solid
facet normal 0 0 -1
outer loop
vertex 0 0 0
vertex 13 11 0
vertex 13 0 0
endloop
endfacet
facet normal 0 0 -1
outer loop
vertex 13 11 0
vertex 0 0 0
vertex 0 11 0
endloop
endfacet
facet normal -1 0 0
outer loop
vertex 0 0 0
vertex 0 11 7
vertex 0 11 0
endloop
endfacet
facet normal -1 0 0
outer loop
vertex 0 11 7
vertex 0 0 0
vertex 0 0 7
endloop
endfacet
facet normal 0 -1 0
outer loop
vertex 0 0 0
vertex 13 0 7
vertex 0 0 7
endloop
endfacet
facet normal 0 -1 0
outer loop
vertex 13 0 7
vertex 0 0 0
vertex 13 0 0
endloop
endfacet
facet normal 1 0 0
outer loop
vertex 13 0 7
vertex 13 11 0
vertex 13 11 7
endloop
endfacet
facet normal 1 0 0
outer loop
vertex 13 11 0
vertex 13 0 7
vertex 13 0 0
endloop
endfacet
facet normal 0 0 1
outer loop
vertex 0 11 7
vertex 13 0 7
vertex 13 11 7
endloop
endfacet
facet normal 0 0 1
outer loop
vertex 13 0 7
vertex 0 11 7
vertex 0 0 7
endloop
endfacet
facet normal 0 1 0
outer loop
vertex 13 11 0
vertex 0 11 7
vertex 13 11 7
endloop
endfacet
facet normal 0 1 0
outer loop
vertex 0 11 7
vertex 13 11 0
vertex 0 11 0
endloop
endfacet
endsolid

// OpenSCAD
translate([2.5, 1.5, 1.0]) color([0.3466679766399683, 0.3834140731648874, 0.7764198986996783]) cube([5, 3, 2], center=true);
translate([2.5, 1.5, 1.0]) color([0.49031967752424566, 0.8812766154122413, 0.6101197429062234]) cube([5, 3, 2], center=true);
translate([2.5, 1.5, 1.0]) color([0.4671884150380703, 0.6323126400553846, 0.3378653798287524]) cube([5, 3, 2], center=true);
translate([2.5, 1.5, 1.0]) color([0.12432379252825243, 0.6825296186925238, 0.622037442746657]) cube([5, 3, 2], center=true);
translate([2.5, 1.5, 1.0]) color([0.7885664913738635, 0.1271091249471088, 0.9117833181295222]) cube([5, 3, 2], center=true);
translate([2.5, 1.5, 1.0]) color([0.799341211421814, 0.9168874080910093, 0.8725347217734669]) cube([5, 3, 2], center=true);
translate([2.5, 1.5, 1.0]) color([0.681006446357057, 0.8102508494373589, 0.5190073092314018]) cube([5, 3, 2], center=true);
translate([3.5, 2.5, 1.5]) color([0.7854891493606652, 0.18912746785718504, 0.7821141063572942]) cube([7, 5, 3], center=true);
translate([3.5, 2.5, 1.5]) color([0.44457960405634067, 0.756616221297365, 0.4554702368121878]) cube([7, 5, 3], center=true);
translate([3.5, 2.5, 1.5]) color([0.7895587282777832, 0.07533958521856021, 0.04464090542441246]) cube([7, 5, 3], center=true);
translate([3.5, 2.5, 1.5]) color([0.9342895823715677, 0.4861651007487351, 0.9010713996489047]) cube([7, 5, 3], center=true);
translate([3.5, 2.5, 1.5]) color([0.9447832518820701, 0.6665111524556335, 0.5717968260934746]) cube([7, 5, 3], center=true);
translate([3.5, 2.5, 1.5]) color([0.21597938410680917, 0.09347621929900818, 0.8193942150822732]) cube([7, 5, 3], center=true);
translate([3.5, 2.5, 1.5]) color([0.8887720676319878, 0.7793957106948857, 0.6985024327316249]) cube([7, 5, 3], center=true);
translate([3.5, 2.5, 1.5]) color([0.42011111607482077, 0.3053115900269564, 0.11344489563770899]) cube([7, 5, 3], center=true);
translate([3.5, 2.5, 1.5]) color([0.425970248072163, 0.5660129742477574, 0.9228805831375125]) cube([7, 5, 3], center=true);
translate([3.5, 2.5, 1.5]) color([0.9357547693309531, 0.41564119654091314, 0.0992109880980957]) cube([7, 5, 3], center=true);
translate([3.5, 2.5, 1.5]) color([0.7738187324714434, 0.7342793416571158, 0.03070084595190614]) cube([7, 5, 3], center=true);
translate([5.5, 3.5, 2.5]) color([0.4467185991338365, 0.6864181042985581, 0.030134234552269934]) cube([11, 7, 5], center=true);
translate([5.5, 3.5, 2.5]) color([0.9192823534016137, 0.9622424865104192, 0.72254277208884]) cube([11, 7, 5], center=true);
translate([5.5, 3.5, 2.5]) color([0.0785385396518038, 0.07032946587635569, 0.3592533148212369]) cube([11, 7, 5], center=true);
translate([5.5, 3.5, 2.5]) color([0.029377507756986443, 0.3478777272843395, 0.009964241312966027]) cube([11, 7, 5], center=true);
translate([5.5, 3.5, 2.5]) color([0.9743235128409679, 0.8190066990688627, 0.07051761147818736]) cube([11, 7, 5], center=true);
translate([5.5, 3.5, 2.5]) color([0.8934350918478603, 0.20797804000401565, 0.20479079826934998]) cube([11, 7, 5], center=true);
translate([5.5, 3.5, 2.5]) color([0.6737591455288341, 0.9382622681625481, 0.12318812122923739]) cube([11, 7, 5], center=true);
translate([5.5, 3.5, 2.5]) color([0.007184567252270457, 0.3691301471700257, 0.024650014436155776]) cube([11, 7, 5], center=true);
translate([5.5, 3.5, 2.5]) color([0.6048482375805311, 0.8591756086192088, 0.1869917024228578]) cube([11, 7, 5], center=true);
translate([5.5, 3.5, 2.5]) color([0.11239103583018406, 0.34444960733861085, 0.9591715206073138]) cube([11, 7, 5], center=true);
translate([5.5, 3.5, 2.5]) color([0.13015769442868408, 0.9665192604669938, 0.36223986994484925]) cube([11, 7, 5], center=true);
translate([5.5, 3.5, 2.5]) color([0.47337040276011155, 0.29263198596497353, 0.9371268442154698]) cube([11, 7, 5], center=true);
translate([5.5, 3.5, 2.5]) color([0.9581478949874975, 0.6359157065077434, 0.18404555017515556]) cube([11, 7, 5], center=true);
translate([6.5, 5.5, 3.5]) color([0.9929517886102871, 0.10258043954691198, 0.5808493815940804]) cube([13, 11, 7], center=true);
translate([6.5, 5.5, 3.5]) color([0.15640306008300875, 0.8976753141502056, 0.9456783914956152]) cube([13, 11, 7], center=true);
translate([6.5, 5.5, 3.5]) color([0.8043902980001079, 0.3158914186681244, 0.2428386899579852]) cube([13, 11, 7], center=true);
translate([6.5, 5.5, 3.5]) color([0.7548584132190378, 0.291059519145354, 0.4197853778540753]) cube([13, 11, 7], center=true);
translate([6.5, 5.5, 3.5]) color([0.04625567690264132, 0.13223381043380655, 0.020549620641776678]) cube([13, 11, 7], center=true);
translate([6.5, 5.5, 3.5]) color([0.0779211200935358, 0.07321114936486084, 0.42023170217414685]) cube([13, 11, 7], center=true);
translate([6.5, 5.5, 3.5]) color([0.5507771776374378, 0.740878819870922, 0.14228347384241602]) cube([13, 11, 7], center=true);
translate([6.5, 5.5, 3.5]) color([0.4221887461694188, 0.6369660374117204, 0.08455569481893255]) cube([13, 11, 7], center=true);
translate([6.5, 5.5, 3.5]) color([0.44481115514620384, 0.3692560392397978, 0.9489319289416618]) cube([13, 11, 7], center=true);
translate([6.5, 5.5, 3.5]) color([0.05785711390101722, 0.40862622118314806, 0.41722547979620506]) cube([13, 11, 7], center=true);
translate([6.5, 5.5, 3.5]) color([0.728180504599678, 0.3206710028745039, 0.20399027594623398]) cube([13, 11, 7], center=true);
translate([6.5, 5.5, 3.5]) color([0.2933116551663051, 0.4708875424493587, 0.9502683295716211]) cube([13, 11, 7], center=true);
translate([6.5, 5.5, 3.5]) color([0.7965170227633064, 0.2769702457797433, 0.5581815883930463]) cube([13, 11, 7], center=true);
translate([6.5, 5.5, 3.5]) color([0.6882003035685332, 0.7956571556821322, 0.4461643839498476]) cube([13, 11, 7], center=true);
translate([6.5, 5.5, 3.5]) color([0.398776905129706, 0.7676407428212785, 0.43171649556411207]) cube([13, 11, 7], center=true);
translate([6.5, 5.5, 3.5]) color([0.2479576688970051, 0.4534470315306477, 0.9371046462904561]) cube([13, 11, 7], center=true);
translate([6.5, 5.5, 3.5]) color([0.14256748821860132, 0.4624353545272121, 0.6373035243637815]) cube([13, 11, 7], center=true);
